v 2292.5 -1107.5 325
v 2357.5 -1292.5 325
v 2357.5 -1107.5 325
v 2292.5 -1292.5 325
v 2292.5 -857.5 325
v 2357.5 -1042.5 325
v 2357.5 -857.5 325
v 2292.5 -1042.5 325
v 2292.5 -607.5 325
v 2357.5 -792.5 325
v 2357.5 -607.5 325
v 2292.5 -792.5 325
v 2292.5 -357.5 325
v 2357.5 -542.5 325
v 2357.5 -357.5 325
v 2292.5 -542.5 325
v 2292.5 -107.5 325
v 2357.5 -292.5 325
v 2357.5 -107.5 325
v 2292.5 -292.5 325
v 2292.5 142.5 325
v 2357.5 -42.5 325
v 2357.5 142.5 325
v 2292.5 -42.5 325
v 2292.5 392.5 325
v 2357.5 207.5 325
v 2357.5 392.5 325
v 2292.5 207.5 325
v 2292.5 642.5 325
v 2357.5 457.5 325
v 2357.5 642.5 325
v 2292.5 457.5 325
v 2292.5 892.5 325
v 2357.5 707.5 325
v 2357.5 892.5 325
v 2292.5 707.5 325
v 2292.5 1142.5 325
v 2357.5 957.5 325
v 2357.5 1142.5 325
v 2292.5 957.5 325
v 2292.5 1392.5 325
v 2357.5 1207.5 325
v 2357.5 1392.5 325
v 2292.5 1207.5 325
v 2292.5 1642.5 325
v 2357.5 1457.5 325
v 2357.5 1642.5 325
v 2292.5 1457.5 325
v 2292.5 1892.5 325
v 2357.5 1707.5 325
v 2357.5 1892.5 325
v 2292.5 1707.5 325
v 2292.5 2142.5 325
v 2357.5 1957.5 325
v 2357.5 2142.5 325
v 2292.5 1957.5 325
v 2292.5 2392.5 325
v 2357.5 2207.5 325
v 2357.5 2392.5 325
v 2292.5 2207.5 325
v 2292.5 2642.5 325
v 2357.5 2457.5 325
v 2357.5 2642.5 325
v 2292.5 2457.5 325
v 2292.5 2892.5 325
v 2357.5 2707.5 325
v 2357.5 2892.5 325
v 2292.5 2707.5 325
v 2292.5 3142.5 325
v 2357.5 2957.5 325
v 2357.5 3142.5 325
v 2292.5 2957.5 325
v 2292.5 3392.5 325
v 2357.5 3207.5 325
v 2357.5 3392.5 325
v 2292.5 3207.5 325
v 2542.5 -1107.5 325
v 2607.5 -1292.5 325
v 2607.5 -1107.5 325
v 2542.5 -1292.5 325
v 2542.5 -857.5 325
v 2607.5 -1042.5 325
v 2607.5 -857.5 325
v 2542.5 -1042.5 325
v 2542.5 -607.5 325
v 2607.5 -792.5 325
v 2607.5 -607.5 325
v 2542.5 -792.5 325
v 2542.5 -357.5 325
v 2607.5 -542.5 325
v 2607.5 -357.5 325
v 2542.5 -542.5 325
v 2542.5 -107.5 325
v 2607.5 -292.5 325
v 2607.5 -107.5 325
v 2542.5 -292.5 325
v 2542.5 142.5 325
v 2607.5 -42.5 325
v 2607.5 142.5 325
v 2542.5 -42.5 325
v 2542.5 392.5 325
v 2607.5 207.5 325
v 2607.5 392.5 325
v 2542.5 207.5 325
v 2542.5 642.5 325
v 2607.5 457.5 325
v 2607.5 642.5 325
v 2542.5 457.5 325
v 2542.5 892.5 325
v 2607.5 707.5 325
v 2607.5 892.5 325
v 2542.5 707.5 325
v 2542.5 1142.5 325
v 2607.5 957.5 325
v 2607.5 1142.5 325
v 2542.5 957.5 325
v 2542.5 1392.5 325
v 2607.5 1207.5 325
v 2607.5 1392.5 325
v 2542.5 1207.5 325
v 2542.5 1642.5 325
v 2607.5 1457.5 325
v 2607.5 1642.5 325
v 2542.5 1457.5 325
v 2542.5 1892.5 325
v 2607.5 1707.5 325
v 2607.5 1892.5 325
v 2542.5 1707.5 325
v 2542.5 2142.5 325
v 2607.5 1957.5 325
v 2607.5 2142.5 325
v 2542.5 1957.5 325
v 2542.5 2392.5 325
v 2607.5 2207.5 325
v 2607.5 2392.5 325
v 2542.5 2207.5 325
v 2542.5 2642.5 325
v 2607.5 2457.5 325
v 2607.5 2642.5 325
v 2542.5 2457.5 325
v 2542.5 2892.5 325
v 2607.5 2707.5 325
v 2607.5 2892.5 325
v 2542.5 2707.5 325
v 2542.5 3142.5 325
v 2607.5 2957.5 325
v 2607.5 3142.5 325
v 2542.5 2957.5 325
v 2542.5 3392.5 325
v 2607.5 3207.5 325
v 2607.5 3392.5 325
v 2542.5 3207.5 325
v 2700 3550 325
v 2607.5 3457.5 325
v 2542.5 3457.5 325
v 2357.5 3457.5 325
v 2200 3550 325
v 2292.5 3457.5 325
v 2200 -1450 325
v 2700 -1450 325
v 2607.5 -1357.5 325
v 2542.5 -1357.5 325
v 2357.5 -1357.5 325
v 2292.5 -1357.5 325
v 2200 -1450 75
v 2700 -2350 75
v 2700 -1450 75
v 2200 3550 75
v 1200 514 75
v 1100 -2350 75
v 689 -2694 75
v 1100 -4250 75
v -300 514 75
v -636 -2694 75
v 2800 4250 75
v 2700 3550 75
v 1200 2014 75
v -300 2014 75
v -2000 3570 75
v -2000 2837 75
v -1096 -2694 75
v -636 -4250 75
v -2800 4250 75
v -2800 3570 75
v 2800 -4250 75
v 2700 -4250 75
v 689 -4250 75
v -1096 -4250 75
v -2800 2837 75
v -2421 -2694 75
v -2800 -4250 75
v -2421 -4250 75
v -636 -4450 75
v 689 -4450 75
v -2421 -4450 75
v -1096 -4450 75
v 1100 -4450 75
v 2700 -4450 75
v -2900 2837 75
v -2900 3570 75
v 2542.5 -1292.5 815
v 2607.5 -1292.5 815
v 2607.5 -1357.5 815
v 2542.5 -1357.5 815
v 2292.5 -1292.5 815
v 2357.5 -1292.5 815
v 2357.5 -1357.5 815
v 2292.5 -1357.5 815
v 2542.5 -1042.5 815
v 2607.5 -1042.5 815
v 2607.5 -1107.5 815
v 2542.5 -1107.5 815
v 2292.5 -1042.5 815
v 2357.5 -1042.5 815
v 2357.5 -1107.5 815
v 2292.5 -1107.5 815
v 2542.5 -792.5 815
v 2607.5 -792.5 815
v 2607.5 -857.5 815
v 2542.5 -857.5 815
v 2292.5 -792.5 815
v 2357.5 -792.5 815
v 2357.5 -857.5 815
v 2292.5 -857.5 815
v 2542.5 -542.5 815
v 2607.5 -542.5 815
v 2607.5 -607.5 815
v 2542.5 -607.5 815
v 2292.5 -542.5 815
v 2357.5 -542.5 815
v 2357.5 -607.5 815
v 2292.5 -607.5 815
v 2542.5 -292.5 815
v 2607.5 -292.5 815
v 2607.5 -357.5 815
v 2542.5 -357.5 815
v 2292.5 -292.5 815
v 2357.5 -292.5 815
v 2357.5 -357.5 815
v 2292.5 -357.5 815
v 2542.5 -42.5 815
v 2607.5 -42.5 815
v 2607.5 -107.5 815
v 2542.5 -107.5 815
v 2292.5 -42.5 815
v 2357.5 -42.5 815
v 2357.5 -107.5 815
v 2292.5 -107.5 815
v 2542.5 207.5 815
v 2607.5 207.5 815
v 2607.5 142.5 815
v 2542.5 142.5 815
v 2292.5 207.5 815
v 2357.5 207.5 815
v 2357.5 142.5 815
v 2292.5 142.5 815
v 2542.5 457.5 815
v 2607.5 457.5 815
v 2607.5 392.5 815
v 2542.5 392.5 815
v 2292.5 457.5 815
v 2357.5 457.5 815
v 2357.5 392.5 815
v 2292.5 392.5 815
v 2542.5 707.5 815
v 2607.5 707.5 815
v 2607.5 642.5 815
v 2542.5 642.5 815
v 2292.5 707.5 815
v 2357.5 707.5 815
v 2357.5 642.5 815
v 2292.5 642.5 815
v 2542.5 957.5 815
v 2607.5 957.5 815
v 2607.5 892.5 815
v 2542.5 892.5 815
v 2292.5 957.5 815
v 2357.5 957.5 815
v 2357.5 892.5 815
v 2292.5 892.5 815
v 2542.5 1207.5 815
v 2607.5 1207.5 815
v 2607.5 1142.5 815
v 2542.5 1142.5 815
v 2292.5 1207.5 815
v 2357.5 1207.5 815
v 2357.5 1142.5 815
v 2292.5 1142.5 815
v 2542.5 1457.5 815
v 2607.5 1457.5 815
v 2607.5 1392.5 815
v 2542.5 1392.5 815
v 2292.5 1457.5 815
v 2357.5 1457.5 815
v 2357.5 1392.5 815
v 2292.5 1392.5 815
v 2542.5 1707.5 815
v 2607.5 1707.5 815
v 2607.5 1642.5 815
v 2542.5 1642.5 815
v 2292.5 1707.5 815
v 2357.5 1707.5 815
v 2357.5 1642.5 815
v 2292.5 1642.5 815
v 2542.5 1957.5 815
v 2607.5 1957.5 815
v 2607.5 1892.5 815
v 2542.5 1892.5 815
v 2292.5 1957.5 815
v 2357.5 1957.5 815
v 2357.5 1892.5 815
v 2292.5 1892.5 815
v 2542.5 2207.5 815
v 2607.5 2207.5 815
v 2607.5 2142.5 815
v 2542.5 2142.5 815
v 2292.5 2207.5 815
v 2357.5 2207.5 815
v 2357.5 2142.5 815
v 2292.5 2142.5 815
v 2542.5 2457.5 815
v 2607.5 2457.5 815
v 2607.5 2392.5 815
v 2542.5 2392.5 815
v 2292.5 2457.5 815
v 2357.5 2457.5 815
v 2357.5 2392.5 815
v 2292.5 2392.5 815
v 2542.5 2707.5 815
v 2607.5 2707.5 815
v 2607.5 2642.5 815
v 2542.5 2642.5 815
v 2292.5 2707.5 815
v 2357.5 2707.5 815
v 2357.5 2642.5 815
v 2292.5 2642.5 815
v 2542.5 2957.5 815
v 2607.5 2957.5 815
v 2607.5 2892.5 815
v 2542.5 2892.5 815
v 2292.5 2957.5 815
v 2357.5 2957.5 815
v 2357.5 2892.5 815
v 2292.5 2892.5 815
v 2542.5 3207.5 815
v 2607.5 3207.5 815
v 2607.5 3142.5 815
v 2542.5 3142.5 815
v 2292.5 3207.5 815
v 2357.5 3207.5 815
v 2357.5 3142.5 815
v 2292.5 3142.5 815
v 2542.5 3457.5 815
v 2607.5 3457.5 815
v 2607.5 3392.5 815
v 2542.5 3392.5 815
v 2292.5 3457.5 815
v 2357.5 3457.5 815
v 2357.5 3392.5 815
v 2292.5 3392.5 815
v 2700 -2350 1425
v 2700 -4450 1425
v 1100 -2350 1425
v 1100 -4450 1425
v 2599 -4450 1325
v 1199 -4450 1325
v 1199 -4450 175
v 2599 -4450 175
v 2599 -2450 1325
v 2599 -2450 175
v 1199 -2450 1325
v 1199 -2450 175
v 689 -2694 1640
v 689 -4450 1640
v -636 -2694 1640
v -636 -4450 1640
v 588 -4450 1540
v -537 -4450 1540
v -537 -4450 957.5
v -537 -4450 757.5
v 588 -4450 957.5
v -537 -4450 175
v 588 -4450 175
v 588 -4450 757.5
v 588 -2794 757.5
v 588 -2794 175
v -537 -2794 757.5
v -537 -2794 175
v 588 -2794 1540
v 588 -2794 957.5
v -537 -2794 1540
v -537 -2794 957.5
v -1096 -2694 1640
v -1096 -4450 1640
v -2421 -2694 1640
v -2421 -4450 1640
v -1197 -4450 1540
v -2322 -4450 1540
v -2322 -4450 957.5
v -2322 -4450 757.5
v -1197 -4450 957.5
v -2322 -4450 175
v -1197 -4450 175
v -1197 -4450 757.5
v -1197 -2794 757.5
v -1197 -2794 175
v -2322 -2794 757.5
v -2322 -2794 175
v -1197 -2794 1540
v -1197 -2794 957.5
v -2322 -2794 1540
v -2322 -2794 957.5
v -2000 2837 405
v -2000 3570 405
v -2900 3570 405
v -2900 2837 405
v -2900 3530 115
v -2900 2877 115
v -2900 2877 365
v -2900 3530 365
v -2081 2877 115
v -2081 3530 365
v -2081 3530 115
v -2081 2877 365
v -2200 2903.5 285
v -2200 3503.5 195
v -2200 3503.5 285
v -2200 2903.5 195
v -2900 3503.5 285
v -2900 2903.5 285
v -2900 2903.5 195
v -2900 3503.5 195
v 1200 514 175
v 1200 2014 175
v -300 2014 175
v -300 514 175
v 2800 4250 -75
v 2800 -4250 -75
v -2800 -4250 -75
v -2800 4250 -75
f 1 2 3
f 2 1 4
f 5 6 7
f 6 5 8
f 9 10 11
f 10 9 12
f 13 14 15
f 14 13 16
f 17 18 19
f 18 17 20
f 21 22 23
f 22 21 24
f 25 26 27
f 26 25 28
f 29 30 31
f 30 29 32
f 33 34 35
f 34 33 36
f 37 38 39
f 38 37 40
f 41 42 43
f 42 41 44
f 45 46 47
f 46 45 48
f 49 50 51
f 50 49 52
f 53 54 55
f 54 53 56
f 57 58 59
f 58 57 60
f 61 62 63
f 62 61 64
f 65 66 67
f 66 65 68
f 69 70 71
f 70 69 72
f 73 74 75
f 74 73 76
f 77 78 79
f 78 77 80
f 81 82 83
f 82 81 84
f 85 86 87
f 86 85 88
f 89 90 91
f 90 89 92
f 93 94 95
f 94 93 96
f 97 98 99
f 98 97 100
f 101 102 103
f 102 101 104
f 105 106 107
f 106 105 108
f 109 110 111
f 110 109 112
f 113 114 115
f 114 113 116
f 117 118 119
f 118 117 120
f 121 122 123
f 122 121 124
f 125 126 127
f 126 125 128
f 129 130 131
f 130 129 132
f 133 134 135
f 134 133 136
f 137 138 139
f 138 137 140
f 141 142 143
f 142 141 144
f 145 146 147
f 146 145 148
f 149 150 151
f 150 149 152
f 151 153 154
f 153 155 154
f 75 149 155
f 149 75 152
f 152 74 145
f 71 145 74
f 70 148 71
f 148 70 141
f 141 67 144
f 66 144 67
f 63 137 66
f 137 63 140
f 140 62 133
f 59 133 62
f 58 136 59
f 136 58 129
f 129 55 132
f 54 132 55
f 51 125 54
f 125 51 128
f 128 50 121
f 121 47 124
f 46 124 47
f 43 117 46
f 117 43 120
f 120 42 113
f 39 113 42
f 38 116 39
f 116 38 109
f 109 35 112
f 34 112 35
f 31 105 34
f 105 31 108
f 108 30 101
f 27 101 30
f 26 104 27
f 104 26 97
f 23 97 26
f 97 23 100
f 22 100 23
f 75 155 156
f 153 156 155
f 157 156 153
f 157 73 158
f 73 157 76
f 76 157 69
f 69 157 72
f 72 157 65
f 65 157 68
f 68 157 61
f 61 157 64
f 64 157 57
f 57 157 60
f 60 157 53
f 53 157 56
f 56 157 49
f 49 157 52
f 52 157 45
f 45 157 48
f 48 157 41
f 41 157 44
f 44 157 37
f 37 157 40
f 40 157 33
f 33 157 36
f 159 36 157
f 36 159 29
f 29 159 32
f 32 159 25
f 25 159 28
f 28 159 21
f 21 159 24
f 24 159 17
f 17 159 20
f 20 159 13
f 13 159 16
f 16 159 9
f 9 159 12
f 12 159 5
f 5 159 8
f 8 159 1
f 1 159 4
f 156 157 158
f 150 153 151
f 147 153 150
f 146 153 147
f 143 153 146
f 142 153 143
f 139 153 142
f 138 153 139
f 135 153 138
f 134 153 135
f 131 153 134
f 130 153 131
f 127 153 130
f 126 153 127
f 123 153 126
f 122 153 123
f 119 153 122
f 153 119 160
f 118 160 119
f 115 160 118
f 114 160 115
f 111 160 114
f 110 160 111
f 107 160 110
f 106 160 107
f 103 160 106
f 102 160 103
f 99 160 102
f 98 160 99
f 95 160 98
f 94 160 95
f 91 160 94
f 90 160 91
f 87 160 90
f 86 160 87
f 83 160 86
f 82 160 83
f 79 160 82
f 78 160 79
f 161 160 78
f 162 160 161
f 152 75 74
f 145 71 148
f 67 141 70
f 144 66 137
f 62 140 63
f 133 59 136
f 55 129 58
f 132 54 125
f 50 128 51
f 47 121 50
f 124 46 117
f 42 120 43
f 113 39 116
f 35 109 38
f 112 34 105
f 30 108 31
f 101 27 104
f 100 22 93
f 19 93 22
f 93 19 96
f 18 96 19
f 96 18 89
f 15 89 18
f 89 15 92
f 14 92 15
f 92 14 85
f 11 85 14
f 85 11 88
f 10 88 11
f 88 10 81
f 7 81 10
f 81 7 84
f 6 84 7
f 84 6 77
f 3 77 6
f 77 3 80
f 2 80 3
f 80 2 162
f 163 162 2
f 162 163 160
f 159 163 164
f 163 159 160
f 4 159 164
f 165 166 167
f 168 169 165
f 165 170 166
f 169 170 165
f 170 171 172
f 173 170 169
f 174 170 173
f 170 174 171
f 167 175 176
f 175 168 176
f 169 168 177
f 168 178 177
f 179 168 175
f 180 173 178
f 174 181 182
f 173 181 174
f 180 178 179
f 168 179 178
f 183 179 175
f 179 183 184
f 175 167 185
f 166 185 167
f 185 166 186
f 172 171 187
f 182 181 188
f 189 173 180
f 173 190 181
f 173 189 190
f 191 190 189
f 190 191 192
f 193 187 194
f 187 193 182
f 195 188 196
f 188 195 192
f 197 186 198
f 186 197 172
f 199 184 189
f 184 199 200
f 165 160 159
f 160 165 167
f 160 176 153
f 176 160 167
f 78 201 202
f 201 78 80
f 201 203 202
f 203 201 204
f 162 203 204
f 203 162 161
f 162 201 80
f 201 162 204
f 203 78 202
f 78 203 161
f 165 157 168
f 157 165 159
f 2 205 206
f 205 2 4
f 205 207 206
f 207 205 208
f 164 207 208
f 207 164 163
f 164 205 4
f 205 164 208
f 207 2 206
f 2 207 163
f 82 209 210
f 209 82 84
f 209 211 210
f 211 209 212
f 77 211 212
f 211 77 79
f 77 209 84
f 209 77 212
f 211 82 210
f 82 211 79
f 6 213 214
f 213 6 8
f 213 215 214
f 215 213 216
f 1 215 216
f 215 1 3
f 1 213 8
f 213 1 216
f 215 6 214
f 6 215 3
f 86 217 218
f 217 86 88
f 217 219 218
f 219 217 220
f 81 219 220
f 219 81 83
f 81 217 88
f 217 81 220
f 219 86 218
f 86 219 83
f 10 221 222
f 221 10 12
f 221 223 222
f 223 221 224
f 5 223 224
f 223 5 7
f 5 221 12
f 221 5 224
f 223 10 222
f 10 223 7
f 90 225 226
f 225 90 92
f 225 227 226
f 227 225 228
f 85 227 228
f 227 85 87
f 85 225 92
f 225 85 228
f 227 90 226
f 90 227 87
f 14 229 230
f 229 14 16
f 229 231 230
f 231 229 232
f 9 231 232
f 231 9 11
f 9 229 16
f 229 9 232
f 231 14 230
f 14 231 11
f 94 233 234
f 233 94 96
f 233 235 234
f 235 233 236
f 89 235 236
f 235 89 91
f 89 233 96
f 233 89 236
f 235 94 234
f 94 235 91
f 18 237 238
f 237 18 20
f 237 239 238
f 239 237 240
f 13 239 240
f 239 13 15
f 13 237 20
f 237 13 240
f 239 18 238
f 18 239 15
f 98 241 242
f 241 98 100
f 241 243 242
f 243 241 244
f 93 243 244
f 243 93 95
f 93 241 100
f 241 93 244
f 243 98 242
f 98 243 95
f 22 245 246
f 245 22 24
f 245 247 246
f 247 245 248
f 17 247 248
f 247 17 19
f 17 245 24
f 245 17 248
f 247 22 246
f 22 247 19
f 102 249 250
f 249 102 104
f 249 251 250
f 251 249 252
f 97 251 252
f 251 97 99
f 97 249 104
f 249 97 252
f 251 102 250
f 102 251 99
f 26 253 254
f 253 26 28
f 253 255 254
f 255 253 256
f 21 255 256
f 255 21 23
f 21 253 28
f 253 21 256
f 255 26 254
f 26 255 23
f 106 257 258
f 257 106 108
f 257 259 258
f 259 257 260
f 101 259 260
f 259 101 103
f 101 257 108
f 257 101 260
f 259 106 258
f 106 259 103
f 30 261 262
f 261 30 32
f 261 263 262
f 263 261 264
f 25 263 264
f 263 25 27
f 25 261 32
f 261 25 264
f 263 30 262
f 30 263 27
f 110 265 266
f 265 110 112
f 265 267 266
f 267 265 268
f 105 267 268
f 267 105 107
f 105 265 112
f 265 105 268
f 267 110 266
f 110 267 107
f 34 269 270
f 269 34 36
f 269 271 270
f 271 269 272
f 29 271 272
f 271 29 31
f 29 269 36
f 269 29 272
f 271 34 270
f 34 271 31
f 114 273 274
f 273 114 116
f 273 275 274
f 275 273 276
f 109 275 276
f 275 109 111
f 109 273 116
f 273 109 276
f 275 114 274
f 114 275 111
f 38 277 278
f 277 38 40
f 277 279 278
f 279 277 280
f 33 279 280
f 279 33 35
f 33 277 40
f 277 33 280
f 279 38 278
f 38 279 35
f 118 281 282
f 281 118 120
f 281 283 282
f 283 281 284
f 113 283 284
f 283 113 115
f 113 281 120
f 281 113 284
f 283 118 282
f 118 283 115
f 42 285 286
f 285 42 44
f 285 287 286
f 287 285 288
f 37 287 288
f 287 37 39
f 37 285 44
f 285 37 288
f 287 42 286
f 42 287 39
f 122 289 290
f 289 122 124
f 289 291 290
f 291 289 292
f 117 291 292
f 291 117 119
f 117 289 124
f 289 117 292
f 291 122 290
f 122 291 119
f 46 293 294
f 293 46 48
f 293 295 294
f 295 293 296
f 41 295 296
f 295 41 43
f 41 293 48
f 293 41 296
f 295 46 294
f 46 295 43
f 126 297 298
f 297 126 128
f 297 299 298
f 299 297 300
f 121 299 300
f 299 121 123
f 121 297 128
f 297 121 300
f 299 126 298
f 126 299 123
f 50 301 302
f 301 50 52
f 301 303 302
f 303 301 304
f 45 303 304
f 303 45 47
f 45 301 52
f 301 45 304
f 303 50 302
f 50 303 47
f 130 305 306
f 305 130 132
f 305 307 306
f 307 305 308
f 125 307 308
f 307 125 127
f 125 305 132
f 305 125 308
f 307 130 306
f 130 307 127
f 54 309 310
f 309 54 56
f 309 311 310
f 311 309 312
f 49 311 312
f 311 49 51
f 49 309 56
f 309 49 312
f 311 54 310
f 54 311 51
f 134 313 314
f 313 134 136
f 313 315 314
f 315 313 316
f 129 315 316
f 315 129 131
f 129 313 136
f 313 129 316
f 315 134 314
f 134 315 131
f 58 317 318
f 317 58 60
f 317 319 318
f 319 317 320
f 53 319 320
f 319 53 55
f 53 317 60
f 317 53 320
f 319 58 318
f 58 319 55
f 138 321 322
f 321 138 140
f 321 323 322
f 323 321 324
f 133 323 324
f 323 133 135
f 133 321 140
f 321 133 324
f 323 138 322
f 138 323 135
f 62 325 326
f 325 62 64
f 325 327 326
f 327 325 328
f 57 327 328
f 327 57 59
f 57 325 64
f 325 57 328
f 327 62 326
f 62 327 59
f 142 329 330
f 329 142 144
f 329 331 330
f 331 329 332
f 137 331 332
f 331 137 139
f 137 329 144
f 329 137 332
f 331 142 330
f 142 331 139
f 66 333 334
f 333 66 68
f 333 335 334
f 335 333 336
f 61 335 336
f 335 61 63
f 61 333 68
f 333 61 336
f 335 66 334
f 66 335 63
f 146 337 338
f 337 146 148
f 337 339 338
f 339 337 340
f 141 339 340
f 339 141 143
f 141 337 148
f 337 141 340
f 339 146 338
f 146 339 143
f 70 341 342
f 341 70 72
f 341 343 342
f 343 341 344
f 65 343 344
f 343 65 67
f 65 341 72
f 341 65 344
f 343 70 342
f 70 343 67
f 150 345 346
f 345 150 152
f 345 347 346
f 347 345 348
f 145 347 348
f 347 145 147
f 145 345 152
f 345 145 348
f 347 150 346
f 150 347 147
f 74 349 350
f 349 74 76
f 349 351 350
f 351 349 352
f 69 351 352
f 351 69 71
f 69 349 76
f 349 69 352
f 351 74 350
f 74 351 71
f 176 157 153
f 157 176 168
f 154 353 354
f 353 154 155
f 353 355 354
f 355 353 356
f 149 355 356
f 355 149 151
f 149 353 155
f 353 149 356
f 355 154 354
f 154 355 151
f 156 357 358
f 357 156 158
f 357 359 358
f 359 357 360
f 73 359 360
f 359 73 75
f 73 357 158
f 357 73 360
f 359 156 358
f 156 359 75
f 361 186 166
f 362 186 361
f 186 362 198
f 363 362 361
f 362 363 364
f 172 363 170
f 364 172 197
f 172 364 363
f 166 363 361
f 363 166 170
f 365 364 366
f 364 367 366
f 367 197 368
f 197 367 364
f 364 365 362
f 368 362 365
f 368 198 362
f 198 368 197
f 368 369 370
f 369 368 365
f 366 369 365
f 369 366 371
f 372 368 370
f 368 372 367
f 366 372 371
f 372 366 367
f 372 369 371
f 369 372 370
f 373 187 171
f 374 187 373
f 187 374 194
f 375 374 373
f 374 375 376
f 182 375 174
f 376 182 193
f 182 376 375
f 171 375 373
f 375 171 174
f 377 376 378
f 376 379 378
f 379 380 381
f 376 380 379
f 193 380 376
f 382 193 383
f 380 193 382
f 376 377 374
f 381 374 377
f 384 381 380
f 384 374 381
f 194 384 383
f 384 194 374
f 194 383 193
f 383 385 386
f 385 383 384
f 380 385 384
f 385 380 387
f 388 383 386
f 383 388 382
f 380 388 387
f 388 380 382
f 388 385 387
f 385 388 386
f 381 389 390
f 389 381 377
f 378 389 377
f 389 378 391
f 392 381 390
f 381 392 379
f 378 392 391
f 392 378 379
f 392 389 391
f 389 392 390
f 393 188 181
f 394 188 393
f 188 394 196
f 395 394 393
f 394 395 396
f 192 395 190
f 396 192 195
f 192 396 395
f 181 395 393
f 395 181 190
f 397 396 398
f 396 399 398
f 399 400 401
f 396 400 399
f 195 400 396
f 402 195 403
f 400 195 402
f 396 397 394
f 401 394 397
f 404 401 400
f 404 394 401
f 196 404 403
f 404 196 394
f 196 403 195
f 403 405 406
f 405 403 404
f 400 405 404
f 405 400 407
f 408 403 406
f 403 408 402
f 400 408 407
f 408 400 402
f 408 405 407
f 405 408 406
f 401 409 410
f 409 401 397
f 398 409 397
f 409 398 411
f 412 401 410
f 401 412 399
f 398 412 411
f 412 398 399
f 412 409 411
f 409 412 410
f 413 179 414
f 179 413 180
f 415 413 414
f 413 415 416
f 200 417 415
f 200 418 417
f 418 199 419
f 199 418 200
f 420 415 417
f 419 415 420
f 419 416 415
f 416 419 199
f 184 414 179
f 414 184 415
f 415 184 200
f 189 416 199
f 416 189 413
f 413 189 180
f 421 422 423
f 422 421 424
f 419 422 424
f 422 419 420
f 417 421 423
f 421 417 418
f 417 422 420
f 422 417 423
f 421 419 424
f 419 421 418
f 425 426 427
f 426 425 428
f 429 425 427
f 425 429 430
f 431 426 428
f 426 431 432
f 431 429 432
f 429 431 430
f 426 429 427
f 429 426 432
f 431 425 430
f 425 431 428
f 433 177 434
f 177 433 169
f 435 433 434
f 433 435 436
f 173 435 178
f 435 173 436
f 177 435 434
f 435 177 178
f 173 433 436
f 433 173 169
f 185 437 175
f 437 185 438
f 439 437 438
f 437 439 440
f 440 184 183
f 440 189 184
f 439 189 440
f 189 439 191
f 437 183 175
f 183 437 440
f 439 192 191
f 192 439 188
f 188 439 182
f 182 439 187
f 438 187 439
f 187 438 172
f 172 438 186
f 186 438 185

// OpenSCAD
// file: Ports.scad
function W_RJ45() = 1600;

module Port_RJ45() {
  w = W_RJ45();
  l = 2100;
  h = 1350;

  difference() {
    cube([w, l, h]);
    translate([100 - 1, -100, 100]) cube([w - 200, l, h - 200]);
  }
}
// main file
use <Ports.scad>;

function W_RPI() = 5600;
function L_RPI() = 8500;
function H_RPI() = 2000;

module RaspberryPiPin(w) {
  // 500, 5079
  w_base = w;
  l_base = w;
  h_base = w;
  color("#444") cube([w_base, l_base, h_base]);

  w_pin = 65;
  l_pin = 65;
  h_pin = 615;
  translate([(w_base - w_pin)/2, (l_base - l_pin)/2, h_base/2]) {
    color("silver") cube([w_pin, l_pin, h_pin]);
  }
}

module RaspberryPiGPIO() {
  w_base = 250;
  for (i = [0:19]) {
    for (j = [0:1]) {
      translate([w_base * i, w_base * j, 0]) RaspberryPiPin(w_base);
    }
  }
}

module RaspberryPiUSB(w) {
  l = 1756;
  h = 1565;

  difference() {
    cube([w, l, h]);
    translate([100 - 1, -100, 100]) cube([w - 200, l, (h / 2) - 200]);
    translate([100 - 1, -100, h/2 + 100]) cube([w - 200, l, (h / 2) - 200]);
  }
}

module RaspberryPiUSBC() {
  w = 900;
  l = 733;
  h = 330;

  translate([0, -l, 0]) {
    color("silver") difference() {
      cube([w, l, h]);
      translate([-1, 40, 40]) cube([w - 80, l - 80, h - 80]);
    }

    translate([0, (l - 600)/2, (h - 90)/2]) {
      color("#666") cube([700, 600, 90]);
    }
  }
}

module RaspberryPi(w=W_RPI(), l=L_RPI()) {
  h_pcb = 150;

  color("#5c5") cube([w, l, h_pcb], center=true);
  translate([0, 0, h_pcb/2]) {
    w_cpu = 1500;
    l_cpu = w_cpu;
    color("silver") translate([(w - w_cpu)/2 - 1600, (l - l_cpu)/2 - 2236, 0]) {
      cube([w_cpu, l_cpu, 200], center=true);
    }

    translate([w/2 - 100, -l/2 + 2800, 0]) rotate([0, 0, 90]) RaspberryPiGPIO();

    translate([w/2 - W_RJ45() - 100, -l/2 - 200, 0]) Port_RJ45();

    w_usb = 1325;
    translate([w/2 - W_RJ45() - 100 - w_usb - 411, -l/2 - 200, 0]) RaspberryPiUSB(w_usb);
    translate([w/2 - W_RJ45() - 100 - w_usb - 411 - w_usb - 460, -l/2 - 200, 0]) RaspberryPiUSB(w_usb);

    translate([-w/2 - 100, l/2 - 680, 0]) RaspberryPiUSBC();
  }
}

RaspberryPi();
